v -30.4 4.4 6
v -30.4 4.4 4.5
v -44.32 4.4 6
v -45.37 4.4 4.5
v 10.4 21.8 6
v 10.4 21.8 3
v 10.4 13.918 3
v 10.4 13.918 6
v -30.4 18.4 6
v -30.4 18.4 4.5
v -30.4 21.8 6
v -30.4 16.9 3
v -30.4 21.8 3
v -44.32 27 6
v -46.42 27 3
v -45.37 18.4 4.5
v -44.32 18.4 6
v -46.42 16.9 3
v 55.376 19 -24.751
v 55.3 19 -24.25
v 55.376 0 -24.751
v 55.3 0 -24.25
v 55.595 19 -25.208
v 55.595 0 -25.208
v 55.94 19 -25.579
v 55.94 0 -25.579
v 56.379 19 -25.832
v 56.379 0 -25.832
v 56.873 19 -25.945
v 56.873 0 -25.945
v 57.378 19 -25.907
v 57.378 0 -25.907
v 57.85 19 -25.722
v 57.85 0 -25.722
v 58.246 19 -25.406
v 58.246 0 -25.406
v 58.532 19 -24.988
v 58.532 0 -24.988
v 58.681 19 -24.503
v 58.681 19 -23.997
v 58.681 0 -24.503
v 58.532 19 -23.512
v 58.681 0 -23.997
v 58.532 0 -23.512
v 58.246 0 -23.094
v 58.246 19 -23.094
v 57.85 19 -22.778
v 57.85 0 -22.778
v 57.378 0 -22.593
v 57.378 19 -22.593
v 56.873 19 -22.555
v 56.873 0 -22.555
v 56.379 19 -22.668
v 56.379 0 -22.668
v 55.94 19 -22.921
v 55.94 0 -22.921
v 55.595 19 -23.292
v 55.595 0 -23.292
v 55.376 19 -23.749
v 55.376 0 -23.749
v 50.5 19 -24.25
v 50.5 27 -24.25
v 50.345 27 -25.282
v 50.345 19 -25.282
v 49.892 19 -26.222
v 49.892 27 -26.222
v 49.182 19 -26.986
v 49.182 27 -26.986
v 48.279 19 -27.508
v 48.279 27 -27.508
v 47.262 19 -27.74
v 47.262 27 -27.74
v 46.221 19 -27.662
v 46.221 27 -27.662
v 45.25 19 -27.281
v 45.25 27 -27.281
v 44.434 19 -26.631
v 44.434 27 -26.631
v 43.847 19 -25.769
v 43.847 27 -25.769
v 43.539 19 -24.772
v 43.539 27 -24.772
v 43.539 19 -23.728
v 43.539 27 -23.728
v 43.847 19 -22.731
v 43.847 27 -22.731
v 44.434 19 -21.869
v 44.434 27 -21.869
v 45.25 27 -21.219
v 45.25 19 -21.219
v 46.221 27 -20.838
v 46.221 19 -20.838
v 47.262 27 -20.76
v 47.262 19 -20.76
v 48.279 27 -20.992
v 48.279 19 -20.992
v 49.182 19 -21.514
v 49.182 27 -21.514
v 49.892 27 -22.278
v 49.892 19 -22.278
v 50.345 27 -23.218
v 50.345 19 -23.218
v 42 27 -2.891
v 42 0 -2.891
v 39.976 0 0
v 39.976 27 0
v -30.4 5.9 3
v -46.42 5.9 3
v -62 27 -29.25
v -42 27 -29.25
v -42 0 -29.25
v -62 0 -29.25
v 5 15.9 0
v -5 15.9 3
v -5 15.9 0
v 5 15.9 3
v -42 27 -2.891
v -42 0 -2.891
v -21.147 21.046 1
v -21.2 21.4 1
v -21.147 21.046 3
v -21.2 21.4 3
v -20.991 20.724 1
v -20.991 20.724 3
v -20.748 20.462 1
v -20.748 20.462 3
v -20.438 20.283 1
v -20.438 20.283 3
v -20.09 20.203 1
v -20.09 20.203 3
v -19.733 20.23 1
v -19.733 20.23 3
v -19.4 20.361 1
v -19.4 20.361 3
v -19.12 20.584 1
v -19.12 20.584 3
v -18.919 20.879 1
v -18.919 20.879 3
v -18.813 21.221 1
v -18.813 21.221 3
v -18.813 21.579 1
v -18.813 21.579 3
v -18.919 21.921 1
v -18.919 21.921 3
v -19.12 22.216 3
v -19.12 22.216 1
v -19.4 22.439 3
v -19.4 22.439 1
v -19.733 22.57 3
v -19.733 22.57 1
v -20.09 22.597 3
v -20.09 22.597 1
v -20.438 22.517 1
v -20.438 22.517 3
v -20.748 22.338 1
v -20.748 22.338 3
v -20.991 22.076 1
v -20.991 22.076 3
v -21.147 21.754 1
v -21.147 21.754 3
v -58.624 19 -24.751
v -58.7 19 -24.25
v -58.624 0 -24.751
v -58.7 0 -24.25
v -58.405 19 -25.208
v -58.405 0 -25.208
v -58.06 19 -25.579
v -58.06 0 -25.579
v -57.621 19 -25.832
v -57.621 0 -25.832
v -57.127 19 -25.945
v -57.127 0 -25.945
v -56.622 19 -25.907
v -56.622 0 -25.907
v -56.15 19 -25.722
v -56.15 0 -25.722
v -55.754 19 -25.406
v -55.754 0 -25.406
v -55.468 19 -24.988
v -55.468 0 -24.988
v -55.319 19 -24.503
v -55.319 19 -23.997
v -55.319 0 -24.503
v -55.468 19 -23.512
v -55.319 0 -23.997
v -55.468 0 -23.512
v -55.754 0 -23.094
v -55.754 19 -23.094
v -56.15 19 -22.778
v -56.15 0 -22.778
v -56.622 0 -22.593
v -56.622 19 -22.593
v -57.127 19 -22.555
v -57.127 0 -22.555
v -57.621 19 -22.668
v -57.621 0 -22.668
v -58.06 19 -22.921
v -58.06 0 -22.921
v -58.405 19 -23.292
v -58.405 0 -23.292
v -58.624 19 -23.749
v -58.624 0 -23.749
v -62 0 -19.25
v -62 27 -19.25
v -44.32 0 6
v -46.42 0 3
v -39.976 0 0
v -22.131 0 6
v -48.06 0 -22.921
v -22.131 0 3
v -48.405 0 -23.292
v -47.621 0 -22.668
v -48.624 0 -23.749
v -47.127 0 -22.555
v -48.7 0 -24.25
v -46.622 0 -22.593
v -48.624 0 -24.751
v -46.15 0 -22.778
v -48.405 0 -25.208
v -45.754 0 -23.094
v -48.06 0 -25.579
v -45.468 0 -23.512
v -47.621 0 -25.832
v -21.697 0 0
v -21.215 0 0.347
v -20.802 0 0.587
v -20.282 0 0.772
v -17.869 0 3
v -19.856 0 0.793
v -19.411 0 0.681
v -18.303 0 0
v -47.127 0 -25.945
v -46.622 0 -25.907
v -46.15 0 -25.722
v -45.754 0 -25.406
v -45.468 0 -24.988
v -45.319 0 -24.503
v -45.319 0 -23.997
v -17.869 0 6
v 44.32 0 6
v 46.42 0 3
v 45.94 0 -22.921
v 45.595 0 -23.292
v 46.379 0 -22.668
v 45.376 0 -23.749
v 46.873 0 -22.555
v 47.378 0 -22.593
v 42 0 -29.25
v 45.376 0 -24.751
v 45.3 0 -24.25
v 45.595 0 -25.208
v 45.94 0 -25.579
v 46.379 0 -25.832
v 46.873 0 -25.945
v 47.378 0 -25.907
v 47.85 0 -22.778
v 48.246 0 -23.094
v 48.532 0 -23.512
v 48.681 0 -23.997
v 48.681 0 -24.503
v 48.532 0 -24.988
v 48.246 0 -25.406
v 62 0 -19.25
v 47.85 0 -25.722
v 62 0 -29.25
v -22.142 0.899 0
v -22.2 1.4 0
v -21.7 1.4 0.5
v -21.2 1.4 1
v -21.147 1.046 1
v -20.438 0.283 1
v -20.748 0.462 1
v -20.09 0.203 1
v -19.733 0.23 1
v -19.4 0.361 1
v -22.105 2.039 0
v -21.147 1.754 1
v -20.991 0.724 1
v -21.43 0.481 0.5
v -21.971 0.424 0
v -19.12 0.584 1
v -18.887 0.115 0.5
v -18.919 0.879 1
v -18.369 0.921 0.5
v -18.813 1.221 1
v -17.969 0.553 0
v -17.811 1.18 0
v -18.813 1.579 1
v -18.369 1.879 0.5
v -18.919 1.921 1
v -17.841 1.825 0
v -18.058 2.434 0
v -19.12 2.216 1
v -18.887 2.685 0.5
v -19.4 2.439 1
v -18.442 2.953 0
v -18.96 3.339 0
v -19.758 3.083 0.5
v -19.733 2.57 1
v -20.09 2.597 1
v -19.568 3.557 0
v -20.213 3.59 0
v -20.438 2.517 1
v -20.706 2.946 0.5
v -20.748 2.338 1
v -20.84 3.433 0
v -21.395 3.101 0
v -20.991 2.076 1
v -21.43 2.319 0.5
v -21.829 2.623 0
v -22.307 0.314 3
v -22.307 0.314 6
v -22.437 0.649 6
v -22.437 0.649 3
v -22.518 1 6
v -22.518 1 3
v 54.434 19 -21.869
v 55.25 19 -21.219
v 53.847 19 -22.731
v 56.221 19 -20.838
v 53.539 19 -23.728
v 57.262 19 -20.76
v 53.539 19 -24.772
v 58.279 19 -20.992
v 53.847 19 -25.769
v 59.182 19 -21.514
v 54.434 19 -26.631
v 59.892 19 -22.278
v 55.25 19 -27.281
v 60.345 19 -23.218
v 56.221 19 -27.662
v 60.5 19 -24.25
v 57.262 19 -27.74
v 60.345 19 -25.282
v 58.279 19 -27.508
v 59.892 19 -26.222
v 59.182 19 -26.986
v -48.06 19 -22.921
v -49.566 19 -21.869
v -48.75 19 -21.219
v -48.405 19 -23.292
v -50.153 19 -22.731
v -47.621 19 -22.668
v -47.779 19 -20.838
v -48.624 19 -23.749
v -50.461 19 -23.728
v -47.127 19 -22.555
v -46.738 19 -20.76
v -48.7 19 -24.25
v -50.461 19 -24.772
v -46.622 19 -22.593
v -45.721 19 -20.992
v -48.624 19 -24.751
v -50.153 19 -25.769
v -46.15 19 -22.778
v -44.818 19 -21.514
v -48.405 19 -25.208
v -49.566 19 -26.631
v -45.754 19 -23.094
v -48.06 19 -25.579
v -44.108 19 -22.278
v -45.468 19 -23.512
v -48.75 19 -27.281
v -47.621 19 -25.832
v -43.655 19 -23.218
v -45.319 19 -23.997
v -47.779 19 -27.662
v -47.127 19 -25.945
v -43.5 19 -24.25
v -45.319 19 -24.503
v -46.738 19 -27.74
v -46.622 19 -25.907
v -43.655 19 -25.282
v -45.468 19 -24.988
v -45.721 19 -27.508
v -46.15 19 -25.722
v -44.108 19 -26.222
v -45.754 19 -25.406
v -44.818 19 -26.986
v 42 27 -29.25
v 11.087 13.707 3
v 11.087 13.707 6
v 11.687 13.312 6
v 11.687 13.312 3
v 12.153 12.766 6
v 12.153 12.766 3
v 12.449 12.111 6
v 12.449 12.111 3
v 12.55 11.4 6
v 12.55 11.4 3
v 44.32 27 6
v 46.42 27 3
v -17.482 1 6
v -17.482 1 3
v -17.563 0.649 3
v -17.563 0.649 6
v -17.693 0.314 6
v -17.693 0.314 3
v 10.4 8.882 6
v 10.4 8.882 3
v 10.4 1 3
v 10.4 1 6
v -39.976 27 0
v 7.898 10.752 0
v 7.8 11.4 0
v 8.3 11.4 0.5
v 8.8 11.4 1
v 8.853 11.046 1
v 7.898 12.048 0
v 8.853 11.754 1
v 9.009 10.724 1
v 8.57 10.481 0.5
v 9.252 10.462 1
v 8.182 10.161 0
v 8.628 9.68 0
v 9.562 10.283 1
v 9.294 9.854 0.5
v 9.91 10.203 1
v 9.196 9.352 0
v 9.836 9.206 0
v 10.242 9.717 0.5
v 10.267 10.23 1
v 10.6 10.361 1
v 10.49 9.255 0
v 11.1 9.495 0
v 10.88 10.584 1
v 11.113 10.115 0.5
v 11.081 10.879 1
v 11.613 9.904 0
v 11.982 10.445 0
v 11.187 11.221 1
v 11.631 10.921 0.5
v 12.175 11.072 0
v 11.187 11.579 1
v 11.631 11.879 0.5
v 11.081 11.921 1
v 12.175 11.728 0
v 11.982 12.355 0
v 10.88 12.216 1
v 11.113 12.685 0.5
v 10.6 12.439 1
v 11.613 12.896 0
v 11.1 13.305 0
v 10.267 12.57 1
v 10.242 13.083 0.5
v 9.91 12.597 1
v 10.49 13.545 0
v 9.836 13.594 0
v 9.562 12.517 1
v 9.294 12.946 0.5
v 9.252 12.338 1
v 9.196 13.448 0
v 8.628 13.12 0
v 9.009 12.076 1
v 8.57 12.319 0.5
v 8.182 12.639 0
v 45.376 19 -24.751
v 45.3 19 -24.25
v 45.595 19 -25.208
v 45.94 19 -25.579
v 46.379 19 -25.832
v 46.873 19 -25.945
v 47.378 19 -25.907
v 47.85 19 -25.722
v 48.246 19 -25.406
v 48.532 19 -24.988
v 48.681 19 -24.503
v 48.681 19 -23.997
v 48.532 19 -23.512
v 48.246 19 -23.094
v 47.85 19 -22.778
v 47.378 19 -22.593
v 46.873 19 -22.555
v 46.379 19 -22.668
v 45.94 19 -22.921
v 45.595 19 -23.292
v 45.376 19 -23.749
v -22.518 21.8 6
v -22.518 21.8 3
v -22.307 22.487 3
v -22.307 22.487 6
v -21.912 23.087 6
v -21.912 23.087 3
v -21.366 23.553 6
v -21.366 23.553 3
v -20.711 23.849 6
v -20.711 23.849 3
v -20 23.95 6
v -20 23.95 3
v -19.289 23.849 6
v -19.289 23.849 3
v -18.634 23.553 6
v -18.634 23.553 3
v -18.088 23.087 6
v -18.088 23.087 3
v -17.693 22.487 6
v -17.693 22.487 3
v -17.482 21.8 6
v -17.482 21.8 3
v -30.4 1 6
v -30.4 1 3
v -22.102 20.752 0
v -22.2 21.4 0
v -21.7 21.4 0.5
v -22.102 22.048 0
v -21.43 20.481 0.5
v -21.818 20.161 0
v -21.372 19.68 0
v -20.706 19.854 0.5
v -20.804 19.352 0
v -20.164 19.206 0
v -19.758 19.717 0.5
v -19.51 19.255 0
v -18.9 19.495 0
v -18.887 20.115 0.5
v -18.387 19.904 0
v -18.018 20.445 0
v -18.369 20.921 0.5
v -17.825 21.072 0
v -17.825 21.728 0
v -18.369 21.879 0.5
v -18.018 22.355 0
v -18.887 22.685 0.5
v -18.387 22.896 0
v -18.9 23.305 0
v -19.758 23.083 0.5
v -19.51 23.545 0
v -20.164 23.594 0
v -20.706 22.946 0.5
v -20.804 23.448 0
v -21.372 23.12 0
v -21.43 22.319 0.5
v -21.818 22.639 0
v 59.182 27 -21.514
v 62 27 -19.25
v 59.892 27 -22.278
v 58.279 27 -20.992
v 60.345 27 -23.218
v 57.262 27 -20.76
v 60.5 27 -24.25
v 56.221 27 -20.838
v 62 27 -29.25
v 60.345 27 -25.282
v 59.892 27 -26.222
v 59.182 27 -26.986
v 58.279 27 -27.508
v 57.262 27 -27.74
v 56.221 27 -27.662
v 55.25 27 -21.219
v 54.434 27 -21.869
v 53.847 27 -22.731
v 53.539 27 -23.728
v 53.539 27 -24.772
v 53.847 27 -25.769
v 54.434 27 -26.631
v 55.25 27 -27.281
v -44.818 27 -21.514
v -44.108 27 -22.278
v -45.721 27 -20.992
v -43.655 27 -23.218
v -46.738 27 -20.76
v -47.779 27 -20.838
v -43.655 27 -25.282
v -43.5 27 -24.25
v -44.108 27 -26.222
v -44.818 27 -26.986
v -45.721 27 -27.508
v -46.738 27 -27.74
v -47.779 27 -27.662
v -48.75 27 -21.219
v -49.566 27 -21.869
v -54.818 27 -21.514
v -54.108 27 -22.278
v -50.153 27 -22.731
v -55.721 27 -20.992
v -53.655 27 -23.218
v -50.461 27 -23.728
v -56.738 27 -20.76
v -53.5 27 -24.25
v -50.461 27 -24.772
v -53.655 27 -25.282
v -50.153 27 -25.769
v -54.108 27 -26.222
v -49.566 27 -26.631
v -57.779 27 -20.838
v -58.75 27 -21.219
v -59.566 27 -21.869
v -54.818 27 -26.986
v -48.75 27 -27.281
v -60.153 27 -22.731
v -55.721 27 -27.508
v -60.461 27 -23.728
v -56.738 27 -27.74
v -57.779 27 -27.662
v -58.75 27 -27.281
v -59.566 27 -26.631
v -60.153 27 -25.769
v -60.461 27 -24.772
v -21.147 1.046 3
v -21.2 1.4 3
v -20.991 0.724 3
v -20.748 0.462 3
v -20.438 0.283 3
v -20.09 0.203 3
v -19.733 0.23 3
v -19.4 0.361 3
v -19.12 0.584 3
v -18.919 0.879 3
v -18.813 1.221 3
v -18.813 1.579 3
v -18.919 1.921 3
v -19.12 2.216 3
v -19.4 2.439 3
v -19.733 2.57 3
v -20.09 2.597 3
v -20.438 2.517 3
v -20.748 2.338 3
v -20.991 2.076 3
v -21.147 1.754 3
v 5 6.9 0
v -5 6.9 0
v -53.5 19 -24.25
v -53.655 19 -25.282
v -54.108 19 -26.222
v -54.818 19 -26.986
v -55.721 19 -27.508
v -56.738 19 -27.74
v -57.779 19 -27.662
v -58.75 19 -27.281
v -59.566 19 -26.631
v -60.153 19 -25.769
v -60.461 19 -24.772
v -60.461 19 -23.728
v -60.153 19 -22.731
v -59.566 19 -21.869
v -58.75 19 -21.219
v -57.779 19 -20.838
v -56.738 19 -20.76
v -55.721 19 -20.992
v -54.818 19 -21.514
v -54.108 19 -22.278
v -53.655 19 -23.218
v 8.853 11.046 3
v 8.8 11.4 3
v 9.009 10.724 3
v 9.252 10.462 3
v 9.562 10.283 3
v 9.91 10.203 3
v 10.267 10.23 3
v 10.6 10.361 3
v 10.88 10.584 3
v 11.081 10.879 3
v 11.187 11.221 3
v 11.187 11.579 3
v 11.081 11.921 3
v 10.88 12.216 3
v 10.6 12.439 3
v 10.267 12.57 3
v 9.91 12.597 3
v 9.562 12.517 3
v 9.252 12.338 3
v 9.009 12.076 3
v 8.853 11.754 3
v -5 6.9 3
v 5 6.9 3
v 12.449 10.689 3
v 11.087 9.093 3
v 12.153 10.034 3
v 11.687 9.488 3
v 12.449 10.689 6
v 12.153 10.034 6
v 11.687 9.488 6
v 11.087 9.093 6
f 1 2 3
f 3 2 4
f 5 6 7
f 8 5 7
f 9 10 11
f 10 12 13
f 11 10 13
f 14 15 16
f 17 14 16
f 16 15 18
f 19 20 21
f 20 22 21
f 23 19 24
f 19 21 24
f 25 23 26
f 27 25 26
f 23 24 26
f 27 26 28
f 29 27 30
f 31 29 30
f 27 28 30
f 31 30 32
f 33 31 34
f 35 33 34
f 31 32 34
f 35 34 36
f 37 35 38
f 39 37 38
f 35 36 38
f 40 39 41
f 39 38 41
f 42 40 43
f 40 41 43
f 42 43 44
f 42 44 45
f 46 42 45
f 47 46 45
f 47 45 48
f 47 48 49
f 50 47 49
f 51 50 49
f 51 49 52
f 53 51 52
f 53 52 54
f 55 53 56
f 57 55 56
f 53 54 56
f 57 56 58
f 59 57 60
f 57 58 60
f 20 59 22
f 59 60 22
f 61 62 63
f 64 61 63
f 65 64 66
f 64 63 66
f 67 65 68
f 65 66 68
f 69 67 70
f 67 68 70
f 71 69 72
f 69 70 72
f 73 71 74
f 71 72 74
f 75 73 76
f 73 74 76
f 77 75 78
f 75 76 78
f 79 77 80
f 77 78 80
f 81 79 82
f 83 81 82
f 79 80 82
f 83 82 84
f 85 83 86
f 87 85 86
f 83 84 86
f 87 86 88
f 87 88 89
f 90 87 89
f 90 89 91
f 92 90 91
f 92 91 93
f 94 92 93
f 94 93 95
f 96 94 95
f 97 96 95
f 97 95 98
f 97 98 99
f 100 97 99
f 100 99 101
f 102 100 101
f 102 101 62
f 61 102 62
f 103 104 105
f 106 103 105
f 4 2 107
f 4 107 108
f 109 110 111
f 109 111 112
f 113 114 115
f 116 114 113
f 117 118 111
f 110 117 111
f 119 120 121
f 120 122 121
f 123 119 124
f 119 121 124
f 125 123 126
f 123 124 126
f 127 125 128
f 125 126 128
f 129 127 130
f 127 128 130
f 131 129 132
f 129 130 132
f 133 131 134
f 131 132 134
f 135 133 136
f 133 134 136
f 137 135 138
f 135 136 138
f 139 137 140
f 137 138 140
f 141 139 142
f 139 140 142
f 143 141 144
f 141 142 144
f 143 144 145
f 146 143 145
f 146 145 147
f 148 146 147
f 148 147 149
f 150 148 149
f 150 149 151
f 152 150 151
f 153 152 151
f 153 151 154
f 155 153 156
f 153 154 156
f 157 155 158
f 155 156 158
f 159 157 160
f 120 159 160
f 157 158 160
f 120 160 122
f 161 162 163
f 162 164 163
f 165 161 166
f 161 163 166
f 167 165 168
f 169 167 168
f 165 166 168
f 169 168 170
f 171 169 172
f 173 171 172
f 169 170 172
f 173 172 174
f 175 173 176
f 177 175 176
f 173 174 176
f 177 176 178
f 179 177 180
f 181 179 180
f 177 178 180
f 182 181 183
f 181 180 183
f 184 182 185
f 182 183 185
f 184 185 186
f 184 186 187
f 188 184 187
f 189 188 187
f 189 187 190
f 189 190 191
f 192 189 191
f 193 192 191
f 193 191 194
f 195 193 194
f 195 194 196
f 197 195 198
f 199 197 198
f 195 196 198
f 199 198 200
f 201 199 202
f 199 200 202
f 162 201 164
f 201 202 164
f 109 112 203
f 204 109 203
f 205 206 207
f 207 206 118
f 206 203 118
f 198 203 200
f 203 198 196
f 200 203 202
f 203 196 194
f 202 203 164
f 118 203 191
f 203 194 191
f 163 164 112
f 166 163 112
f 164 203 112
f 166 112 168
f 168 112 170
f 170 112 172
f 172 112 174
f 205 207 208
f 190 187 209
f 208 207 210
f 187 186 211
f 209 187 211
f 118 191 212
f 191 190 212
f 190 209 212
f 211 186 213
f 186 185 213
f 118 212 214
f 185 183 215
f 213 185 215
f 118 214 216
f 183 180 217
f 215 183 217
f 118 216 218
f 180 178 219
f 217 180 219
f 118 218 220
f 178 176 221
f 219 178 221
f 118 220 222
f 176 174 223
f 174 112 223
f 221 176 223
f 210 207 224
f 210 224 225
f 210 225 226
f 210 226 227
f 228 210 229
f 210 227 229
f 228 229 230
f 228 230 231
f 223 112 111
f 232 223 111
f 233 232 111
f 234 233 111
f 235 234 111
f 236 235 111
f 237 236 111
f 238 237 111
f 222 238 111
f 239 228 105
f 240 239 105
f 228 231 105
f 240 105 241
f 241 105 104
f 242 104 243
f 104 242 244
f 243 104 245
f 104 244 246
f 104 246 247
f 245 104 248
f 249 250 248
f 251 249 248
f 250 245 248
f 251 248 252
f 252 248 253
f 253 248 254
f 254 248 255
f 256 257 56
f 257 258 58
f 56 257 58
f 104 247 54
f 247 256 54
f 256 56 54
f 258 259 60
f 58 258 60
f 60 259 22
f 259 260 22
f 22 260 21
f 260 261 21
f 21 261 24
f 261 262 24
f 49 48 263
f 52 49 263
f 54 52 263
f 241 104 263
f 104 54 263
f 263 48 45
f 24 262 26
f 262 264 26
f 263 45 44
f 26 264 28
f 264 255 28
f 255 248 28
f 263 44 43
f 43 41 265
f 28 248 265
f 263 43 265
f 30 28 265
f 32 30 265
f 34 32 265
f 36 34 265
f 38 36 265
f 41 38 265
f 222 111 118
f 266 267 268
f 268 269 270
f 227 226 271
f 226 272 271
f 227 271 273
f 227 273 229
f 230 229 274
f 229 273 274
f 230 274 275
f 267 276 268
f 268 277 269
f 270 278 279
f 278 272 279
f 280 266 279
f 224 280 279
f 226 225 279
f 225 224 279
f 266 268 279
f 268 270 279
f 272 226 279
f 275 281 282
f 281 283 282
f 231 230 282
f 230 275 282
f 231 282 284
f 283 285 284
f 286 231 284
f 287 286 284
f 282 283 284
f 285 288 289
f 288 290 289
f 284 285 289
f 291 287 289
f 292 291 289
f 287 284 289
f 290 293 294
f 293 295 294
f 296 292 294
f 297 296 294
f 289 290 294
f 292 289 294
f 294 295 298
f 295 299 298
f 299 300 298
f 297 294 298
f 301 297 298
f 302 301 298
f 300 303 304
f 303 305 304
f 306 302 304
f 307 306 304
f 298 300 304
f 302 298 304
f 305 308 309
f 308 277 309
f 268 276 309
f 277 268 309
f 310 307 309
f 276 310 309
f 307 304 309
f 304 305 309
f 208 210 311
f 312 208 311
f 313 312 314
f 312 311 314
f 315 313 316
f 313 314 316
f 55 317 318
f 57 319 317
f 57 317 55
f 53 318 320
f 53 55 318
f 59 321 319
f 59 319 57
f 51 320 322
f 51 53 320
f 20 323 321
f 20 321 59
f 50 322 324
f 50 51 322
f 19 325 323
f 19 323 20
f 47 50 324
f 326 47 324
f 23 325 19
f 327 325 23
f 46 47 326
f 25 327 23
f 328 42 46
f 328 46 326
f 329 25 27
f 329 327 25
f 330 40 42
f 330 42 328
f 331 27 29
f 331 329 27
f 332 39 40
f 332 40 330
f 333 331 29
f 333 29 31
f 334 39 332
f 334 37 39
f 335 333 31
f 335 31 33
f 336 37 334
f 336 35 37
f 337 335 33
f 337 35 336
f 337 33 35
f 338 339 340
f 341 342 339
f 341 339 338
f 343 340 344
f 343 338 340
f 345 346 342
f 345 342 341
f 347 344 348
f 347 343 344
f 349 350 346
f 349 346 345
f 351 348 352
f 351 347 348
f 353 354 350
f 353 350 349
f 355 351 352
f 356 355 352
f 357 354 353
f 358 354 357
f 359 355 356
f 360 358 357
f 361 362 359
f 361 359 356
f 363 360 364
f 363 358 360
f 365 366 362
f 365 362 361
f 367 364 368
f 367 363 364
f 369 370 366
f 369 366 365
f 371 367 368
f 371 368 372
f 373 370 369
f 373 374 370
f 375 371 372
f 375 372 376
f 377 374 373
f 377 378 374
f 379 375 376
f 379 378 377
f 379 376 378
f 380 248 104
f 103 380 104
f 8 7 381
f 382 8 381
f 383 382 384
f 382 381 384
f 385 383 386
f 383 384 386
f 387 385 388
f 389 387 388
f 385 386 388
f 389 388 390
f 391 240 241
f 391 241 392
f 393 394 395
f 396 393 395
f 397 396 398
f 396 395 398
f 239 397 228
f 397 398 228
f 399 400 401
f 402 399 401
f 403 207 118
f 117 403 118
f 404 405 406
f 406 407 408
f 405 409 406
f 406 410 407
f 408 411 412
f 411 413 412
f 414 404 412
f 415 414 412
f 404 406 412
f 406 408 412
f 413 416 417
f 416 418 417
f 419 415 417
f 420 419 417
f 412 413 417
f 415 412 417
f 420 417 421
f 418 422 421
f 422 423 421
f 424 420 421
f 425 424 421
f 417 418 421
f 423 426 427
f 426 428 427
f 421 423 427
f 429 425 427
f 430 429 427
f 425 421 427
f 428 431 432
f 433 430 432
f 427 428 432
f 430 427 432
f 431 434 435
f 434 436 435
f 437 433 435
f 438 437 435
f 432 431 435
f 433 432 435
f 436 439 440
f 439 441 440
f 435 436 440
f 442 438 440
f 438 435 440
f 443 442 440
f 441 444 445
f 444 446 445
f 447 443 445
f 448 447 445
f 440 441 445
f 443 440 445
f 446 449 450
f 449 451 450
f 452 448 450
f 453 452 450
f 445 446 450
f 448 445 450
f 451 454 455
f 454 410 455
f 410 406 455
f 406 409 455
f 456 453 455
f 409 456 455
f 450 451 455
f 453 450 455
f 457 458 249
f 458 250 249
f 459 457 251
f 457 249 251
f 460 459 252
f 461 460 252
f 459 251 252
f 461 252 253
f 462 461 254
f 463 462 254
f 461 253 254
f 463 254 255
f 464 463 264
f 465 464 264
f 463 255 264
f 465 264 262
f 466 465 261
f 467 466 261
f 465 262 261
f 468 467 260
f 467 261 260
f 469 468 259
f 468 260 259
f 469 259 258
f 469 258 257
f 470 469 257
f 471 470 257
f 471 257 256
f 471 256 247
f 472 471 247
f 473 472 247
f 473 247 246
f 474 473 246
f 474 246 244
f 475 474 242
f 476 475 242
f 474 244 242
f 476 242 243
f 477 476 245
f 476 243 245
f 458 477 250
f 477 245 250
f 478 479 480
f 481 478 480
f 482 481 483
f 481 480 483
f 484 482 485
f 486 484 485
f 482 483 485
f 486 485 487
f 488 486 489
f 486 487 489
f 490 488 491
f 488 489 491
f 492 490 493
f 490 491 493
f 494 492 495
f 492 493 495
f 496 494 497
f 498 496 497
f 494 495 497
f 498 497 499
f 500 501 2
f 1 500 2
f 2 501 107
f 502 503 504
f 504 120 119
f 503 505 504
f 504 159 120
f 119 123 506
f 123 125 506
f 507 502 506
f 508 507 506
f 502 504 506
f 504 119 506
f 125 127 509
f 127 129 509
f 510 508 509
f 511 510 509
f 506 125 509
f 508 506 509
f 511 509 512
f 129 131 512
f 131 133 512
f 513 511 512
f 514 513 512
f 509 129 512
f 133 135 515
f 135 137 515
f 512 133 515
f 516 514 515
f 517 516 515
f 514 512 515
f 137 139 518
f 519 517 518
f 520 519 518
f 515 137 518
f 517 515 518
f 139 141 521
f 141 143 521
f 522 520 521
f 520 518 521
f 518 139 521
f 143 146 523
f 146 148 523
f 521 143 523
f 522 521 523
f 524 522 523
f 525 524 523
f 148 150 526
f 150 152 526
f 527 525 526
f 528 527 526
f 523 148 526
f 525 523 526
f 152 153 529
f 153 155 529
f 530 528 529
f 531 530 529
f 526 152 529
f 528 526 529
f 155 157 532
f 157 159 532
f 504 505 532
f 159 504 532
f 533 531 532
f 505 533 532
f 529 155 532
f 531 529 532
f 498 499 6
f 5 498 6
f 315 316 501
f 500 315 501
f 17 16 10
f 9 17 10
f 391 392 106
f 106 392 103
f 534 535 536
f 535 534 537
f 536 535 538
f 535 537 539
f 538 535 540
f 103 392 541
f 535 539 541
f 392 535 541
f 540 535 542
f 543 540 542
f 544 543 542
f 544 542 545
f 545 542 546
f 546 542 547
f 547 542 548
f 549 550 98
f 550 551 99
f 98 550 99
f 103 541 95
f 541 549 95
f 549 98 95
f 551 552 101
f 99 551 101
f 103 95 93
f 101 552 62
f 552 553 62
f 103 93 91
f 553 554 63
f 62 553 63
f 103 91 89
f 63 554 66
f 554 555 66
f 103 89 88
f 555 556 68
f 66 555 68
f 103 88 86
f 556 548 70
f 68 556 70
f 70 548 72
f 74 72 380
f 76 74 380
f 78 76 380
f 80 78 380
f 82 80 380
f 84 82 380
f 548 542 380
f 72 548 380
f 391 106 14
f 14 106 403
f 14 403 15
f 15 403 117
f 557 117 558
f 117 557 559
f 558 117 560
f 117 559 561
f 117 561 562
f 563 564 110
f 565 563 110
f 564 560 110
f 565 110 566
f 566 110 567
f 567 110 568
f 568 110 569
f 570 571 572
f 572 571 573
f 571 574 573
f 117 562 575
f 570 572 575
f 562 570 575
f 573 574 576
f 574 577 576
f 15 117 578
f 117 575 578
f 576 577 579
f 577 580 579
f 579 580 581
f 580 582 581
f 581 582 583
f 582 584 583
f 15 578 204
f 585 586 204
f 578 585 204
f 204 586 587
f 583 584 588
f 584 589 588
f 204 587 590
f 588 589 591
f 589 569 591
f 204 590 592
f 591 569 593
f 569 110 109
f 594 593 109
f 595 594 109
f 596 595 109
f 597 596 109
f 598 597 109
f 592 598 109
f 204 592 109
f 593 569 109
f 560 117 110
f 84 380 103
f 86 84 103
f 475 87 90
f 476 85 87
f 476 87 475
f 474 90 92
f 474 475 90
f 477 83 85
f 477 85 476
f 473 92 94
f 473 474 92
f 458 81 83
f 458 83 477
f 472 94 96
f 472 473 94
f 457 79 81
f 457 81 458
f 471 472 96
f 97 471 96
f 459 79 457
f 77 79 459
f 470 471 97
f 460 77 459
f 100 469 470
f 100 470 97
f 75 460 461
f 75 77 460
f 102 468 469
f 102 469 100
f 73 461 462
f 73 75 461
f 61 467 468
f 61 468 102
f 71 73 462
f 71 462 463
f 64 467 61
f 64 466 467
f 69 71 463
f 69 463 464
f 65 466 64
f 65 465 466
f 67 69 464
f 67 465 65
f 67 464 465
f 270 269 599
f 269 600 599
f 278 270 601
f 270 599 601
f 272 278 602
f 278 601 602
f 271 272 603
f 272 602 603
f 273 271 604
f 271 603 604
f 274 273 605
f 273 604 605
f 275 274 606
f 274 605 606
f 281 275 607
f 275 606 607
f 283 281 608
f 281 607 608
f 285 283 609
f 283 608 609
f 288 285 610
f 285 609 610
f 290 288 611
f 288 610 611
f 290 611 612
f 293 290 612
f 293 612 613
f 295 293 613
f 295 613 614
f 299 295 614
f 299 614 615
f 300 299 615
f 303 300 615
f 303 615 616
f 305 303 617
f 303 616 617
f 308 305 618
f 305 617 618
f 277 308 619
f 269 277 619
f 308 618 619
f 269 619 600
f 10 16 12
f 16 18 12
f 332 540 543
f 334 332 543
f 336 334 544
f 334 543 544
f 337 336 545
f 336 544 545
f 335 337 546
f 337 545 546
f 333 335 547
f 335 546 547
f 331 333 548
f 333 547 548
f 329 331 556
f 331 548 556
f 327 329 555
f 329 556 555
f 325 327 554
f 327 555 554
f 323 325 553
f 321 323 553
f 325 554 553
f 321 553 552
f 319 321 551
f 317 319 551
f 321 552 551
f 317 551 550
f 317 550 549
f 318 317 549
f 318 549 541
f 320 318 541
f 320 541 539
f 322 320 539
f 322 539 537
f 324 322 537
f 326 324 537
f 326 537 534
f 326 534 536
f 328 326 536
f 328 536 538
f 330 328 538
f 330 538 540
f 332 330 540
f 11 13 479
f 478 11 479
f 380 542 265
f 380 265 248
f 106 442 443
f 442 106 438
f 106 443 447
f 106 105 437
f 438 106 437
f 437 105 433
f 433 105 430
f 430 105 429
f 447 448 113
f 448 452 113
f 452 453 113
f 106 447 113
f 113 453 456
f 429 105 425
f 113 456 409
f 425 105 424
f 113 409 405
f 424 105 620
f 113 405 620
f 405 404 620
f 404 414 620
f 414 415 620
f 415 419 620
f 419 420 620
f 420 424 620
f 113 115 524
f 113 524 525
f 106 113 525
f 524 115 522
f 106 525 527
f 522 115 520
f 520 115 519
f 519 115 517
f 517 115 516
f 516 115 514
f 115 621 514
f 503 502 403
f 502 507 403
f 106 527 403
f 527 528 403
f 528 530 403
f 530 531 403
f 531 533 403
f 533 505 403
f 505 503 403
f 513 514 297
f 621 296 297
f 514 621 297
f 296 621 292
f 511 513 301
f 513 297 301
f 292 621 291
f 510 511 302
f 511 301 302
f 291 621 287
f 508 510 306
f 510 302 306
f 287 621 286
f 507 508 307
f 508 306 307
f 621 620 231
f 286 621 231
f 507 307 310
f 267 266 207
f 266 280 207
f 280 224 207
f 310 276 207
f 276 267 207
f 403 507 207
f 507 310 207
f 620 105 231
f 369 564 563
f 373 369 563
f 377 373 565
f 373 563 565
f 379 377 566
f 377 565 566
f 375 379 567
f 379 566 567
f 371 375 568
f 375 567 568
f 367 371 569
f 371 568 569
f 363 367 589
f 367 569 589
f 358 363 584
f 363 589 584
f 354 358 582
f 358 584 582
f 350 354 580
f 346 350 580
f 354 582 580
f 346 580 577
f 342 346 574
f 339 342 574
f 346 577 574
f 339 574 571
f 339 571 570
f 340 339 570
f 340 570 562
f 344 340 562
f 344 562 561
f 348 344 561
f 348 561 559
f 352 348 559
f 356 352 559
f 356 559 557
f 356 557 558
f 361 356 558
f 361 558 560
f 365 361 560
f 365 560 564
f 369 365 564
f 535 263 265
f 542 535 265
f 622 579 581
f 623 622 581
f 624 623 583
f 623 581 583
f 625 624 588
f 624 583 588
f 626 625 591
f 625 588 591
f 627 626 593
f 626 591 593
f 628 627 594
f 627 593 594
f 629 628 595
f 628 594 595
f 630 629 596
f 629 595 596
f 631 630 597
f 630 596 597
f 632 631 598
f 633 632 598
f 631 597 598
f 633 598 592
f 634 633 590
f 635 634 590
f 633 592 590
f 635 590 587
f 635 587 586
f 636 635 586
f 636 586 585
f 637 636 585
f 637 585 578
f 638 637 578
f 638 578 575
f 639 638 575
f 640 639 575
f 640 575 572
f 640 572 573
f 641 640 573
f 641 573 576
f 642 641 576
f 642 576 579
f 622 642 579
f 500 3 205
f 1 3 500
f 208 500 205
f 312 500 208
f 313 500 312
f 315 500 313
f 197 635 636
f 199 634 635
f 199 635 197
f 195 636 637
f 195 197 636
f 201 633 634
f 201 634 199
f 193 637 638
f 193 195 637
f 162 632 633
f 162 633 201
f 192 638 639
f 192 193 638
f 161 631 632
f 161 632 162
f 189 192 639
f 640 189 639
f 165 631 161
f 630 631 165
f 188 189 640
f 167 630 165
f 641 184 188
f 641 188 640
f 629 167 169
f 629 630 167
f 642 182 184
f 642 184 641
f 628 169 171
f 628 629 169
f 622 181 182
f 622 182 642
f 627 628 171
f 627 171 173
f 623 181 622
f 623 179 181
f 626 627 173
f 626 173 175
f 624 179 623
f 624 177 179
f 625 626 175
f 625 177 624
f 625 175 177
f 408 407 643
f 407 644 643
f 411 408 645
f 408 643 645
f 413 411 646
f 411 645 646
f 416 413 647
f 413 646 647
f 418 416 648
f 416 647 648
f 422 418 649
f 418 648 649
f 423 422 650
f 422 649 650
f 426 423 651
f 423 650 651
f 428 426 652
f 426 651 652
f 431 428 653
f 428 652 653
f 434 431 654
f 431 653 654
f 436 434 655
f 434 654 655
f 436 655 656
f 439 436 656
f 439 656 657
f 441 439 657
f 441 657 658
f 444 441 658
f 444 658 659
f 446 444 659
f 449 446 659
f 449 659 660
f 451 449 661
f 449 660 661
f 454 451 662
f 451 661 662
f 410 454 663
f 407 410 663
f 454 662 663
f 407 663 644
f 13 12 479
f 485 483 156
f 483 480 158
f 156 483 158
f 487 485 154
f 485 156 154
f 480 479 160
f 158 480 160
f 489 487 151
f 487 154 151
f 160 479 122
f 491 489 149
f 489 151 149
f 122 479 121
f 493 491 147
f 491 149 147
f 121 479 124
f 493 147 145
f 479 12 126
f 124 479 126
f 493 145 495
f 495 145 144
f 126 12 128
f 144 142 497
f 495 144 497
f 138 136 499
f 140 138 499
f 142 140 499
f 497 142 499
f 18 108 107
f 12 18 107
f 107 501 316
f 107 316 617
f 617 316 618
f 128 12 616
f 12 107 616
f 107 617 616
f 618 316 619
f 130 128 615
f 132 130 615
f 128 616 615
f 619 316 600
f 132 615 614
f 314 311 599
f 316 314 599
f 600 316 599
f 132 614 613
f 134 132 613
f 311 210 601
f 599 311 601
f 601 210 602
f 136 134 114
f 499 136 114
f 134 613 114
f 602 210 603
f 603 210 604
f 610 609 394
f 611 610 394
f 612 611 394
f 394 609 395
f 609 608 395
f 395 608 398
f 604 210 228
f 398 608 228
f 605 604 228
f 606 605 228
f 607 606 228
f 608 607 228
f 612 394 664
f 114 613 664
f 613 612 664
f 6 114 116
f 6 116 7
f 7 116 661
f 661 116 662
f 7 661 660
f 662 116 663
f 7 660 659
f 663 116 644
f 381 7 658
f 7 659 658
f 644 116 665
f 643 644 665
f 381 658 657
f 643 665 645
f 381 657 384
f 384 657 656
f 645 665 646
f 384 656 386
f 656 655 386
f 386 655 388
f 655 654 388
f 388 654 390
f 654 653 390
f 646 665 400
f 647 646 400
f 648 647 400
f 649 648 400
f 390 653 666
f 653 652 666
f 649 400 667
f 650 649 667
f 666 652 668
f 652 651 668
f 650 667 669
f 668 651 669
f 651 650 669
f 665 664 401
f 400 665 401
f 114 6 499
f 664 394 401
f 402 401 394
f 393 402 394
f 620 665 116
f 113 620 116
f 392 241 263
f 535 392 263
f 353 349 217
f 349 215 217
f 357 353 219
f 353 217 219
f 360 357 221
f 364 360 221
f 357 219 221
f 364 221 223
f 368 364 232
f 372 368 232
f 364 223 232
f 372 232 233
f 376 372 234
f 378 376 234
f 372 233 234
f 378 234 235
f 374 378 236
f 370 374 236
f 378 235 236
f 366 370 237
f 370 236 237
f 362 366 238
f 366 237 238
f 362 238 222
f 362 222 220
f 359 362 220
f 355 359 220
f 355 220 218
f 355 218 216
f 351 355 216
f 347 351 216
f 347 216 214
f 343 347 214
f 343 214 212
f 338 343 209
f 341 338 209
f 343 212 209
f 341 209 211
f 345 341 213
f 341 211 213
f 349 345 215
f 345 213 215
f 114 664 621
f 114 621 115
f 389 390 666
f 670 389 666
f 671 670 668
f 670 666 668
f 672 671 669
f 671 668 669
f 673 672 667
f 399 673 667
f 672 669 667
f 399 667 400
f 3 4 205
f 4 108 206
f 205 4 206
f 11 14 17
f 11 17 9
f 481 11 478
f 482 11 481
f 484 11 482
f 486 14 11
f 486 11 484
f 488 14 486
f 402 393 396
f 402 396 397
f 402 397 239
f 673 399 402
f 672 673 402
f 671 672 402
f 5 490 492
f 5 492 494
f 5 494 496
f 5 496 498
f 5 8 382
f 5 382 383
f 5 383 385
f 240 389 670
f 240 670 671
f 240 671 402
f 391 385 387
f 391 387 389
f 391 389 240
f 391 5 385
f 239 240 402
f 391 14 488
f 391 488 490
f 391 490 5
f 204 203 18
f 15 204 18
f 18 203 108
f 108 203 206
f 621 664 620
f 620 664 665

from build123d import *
from OCP.BRepFilletAPI import BRepFilletAPI_MakeChamfer

# Parameters (mm, degrees)
BOSS_EXTRUDE1_DEPTH                                 = 27
SKETCH2_W                                           = 10
SKETCH2_H                                           = 9
CUT_EXTRUDE1_DEPTH                                  = 75.920374398
CBORE_FOR_M3_PAN_HEAD_SCREW1_D                      = 3.4
CBORE_FOR_M3_PAN_HEAD_SCREW1_CBORE_D                = 7
CBORE_FOR_M3_PAN_HEAD_SCREW1_CBORE_DEPTH            = 8
CSK_FOR_M2_COUNTERSUNK_FLAT_HEAD_SCREW1_D           = 2.4
CSK_FOR_M2_COUNTERSUNK_FLAT_HEAD_SCREW1_CSINK_D     = 4.4
CSK_FOR_M2_COUNTERSUNK_FLAT_HEAD_SCREW1_CSINK_ANGLE = 90
BOSS_EXTRUDE2_DEPTH                                 = 3
CHAMFER1_SIZE                                       = 1.5
CHAMFER2_SIZE                                       = 3
CHAMFER2_SIZE_2                                     = 2.100622615


with BuildPart() as part:
    # Sketch1 → Boss-Extrude1 (new body)
    with BuildSketch(Plane(origin=(0, 0, 0), x_dir=(1, 0, 0), z_dir=(0, 1, 0))):
        Polygon((39.975582768, 0), (0, 0), (0, -3), (46.420382275, -3), (62, 19.25), (62, 29.25), (42, 29.25), (42, 2.891167435), align=None)
        Polygon((0, -3), (0, 0), (-39.975582768, 0), (-42, 2.891167435), (-42, 29.25), (-62, 29.25), (-62, 19.25), (-46.420382275, -3), align=None)
    extrude(amount=BOSS_EXTRUDE1_DEPTH)

    # Sketch2 → Cut-Extrude1 (cut, through all)
    with BuildSketch(Plane.XY.offset(3)):
        with Locations((0, 11.4)):
            Rectangle(SKETCH2_W, SKETCH2_H)
    extrude(amount=-CUT_EXTRUDE1_DEPTH, mode=Mode.SUBTRACT)

    # CBORE for M3 Pan Head Screw1 (through all)
    with Locations(Plane(origin=(0, 27, 0), x_dir=(1, 0, 0), z_dir=(0, 1, 0))):
        with Locations((-57, 24.25), (-47, 24.25), (47, 24.25), (57, 24.25)):
            CounterBoreHole(CBORE_FOR_M3_PAN_HEAD_SCREW1_D / 2, CBORE_FOR_M3_PAN_HEAD_SCREW1_CBORE_D / 2, CBORE_FOR_M3_PAN_HEAD_SCREW1_CBORE_DEPTH)

    # CSK for M2 Countersunk Flat Head Screw1 (through all)
    with Locations(Plane(origin=(0, 0, 0), x_dir=(1, 0, 0), z_dir=(0, 0, -1))):
        with Locations((-20, -21.400004303), (-20, -1.4), (10, -11.4)):
            CounterSinkHole(CSK_FOR_M2_COUNTERSUNK_FLAT_HEAD_SCREW1_D / 2, CSK_FOR_M2_COUNTERSUNK_FLAT_HEAD_SCREW1_CSINK_D / 2, counter_sink_angle=CSK_FOR_M2_COUNTERSUNK_FLAT_HEAD_SCREW1_CSINK_ANGLE)

    # Sketch7 → Boss-Extrude2 (add)
    with BuildSketch(Plane.XY.offset(3)):
        with BuildLine():
            Line((-30.4, 18.4), (-30.4, 21.8))
            Line((-30.4, 21.8), (-22.518432735, 21.8))
            ThreePointArc((-22.518432735, 21.8), (-20, 23.950004303), (-17.481567265, 21.8))
            Line((-17.481567265, 21.8), (10.4, 21.8))
            Line((10.4, 21.8), (10.4, 13.918432052))
            ThreePointArc((10.4, 13.918432052), (11.939394235, 13.055672069), (12.55, 11.4))
            ThreePointArc((12.55, 11.4), (11.939394235, 9.744327931), (10.4, 8.881567948))
            Line((10.4, 8.881567948), (10.4, 1))
            Line((10.4, 1), (-17.481567948, 1))
            ThreePointArc((-17.481567948, 1), (-17.621968265, 0.479421341), (-17.868685851, 0))
            Line((-17.868685851, 0), (46.420382275, 0))
            Line((46.420382275, 0), (46.420382275, 27))
            Line((46.420382275, 27), (-46.420382275, 27))
            Line((-46.420382275, 27), (-46.420382275, 18.4))
            Line((-46.420382275, 18.4), (-30.4, 18.4))
        make_face()
        with BuildLine():
            Line((-30.4, 1), (-30.4, 4.4))
            Line((-30.4, 4.4), (-46.420382275, 4.4))
            Line((-46.420382275, 4.4), (-46.420382275, 0))
            Line((-46.420382275, 0), (-22.131314149, 0))
            ThreePointArc((-22.131314149, 0), (-22.378031735, 0.479421341), (-22.518432052, 1))
            Line((-22.518432052, 1), (-30.4, 1))
        make_face()
    extrude(amount=BOSS_EXTRUDE2_DEPTH)

    # Chamfer1
    chamfer1_edges = [part.edges().sort_by_distance(p)[0] for p in [
        (-38.410191137, 18.4, 3),
        (-38.410191137, 4.4, 3),
    ]]
    chamfer(chamfer1_edges, length=CHAMFER1_SIZE)

    # Chamfer2
    chamfer2_edges_1 = [part.edges().sort_by_distance(p)[0] for p in [
        (46.420382275, 13.5, 6),
    ]]
    chamfer2_side_1 = [part.faces().sort_by_distance(p)[0] for p in [
        (46.420382275, 13.5, 5.957987548),
    ]]
    chamfer2_edges_2 = [part.edges().sort_by_distance(p)[0] for p in [
        (-46.420382275, 22.7, 6),
    ]]
    chamfer2_side_2 = [part.faces().sort_by_distance(p)[0] for p in [
        (-46.378369823, 22.7, 6),
    ]]
    chamfer2_edges_3 = [part.edges().sort_by_distance(p)[0] for p in [
        (-46.420382275, 2.2, 6),
    ]]
    chamfer2_side_3 = [part.faces().sort_by_distance(p)[0] for p in [
        (-46.378369823, 2.2, 6),
    ]]
    chamfer2 = BRepFilletAPI_MakeChamfer(part.part.solid().wrapped)
    for e in chamfer2_edges_1:
        chamfer2.Add(CHAMFER2_SIZE - 0.0001, CHAMFER2_SIZE_2 - 0.0001, e.wrapped, chamfer2_side_1[0].wrapped)
    for e in chamfer2_edges_2:
        chamfer2.Add(CHAMFER2_SIZE_2 - 0.0001, CHAMFER2_SIZE - 0.0001, e.wrapped, chamfer2_side_2[0].wrapped)
    for e in chamfer2_edges_3:
        chamfer2.Add(CHAMFER2_SIZE_2 - 0.0001, CHAMFER2_SIZE - 0.0001, e.wrapped, chamfer2_side_3[0].wrapped)
    add(Compound.cast(chamfer2.Shape()), mode=Mode.REPLACE)  # a hair under: the kernel refuses the full size


solid = part.part
